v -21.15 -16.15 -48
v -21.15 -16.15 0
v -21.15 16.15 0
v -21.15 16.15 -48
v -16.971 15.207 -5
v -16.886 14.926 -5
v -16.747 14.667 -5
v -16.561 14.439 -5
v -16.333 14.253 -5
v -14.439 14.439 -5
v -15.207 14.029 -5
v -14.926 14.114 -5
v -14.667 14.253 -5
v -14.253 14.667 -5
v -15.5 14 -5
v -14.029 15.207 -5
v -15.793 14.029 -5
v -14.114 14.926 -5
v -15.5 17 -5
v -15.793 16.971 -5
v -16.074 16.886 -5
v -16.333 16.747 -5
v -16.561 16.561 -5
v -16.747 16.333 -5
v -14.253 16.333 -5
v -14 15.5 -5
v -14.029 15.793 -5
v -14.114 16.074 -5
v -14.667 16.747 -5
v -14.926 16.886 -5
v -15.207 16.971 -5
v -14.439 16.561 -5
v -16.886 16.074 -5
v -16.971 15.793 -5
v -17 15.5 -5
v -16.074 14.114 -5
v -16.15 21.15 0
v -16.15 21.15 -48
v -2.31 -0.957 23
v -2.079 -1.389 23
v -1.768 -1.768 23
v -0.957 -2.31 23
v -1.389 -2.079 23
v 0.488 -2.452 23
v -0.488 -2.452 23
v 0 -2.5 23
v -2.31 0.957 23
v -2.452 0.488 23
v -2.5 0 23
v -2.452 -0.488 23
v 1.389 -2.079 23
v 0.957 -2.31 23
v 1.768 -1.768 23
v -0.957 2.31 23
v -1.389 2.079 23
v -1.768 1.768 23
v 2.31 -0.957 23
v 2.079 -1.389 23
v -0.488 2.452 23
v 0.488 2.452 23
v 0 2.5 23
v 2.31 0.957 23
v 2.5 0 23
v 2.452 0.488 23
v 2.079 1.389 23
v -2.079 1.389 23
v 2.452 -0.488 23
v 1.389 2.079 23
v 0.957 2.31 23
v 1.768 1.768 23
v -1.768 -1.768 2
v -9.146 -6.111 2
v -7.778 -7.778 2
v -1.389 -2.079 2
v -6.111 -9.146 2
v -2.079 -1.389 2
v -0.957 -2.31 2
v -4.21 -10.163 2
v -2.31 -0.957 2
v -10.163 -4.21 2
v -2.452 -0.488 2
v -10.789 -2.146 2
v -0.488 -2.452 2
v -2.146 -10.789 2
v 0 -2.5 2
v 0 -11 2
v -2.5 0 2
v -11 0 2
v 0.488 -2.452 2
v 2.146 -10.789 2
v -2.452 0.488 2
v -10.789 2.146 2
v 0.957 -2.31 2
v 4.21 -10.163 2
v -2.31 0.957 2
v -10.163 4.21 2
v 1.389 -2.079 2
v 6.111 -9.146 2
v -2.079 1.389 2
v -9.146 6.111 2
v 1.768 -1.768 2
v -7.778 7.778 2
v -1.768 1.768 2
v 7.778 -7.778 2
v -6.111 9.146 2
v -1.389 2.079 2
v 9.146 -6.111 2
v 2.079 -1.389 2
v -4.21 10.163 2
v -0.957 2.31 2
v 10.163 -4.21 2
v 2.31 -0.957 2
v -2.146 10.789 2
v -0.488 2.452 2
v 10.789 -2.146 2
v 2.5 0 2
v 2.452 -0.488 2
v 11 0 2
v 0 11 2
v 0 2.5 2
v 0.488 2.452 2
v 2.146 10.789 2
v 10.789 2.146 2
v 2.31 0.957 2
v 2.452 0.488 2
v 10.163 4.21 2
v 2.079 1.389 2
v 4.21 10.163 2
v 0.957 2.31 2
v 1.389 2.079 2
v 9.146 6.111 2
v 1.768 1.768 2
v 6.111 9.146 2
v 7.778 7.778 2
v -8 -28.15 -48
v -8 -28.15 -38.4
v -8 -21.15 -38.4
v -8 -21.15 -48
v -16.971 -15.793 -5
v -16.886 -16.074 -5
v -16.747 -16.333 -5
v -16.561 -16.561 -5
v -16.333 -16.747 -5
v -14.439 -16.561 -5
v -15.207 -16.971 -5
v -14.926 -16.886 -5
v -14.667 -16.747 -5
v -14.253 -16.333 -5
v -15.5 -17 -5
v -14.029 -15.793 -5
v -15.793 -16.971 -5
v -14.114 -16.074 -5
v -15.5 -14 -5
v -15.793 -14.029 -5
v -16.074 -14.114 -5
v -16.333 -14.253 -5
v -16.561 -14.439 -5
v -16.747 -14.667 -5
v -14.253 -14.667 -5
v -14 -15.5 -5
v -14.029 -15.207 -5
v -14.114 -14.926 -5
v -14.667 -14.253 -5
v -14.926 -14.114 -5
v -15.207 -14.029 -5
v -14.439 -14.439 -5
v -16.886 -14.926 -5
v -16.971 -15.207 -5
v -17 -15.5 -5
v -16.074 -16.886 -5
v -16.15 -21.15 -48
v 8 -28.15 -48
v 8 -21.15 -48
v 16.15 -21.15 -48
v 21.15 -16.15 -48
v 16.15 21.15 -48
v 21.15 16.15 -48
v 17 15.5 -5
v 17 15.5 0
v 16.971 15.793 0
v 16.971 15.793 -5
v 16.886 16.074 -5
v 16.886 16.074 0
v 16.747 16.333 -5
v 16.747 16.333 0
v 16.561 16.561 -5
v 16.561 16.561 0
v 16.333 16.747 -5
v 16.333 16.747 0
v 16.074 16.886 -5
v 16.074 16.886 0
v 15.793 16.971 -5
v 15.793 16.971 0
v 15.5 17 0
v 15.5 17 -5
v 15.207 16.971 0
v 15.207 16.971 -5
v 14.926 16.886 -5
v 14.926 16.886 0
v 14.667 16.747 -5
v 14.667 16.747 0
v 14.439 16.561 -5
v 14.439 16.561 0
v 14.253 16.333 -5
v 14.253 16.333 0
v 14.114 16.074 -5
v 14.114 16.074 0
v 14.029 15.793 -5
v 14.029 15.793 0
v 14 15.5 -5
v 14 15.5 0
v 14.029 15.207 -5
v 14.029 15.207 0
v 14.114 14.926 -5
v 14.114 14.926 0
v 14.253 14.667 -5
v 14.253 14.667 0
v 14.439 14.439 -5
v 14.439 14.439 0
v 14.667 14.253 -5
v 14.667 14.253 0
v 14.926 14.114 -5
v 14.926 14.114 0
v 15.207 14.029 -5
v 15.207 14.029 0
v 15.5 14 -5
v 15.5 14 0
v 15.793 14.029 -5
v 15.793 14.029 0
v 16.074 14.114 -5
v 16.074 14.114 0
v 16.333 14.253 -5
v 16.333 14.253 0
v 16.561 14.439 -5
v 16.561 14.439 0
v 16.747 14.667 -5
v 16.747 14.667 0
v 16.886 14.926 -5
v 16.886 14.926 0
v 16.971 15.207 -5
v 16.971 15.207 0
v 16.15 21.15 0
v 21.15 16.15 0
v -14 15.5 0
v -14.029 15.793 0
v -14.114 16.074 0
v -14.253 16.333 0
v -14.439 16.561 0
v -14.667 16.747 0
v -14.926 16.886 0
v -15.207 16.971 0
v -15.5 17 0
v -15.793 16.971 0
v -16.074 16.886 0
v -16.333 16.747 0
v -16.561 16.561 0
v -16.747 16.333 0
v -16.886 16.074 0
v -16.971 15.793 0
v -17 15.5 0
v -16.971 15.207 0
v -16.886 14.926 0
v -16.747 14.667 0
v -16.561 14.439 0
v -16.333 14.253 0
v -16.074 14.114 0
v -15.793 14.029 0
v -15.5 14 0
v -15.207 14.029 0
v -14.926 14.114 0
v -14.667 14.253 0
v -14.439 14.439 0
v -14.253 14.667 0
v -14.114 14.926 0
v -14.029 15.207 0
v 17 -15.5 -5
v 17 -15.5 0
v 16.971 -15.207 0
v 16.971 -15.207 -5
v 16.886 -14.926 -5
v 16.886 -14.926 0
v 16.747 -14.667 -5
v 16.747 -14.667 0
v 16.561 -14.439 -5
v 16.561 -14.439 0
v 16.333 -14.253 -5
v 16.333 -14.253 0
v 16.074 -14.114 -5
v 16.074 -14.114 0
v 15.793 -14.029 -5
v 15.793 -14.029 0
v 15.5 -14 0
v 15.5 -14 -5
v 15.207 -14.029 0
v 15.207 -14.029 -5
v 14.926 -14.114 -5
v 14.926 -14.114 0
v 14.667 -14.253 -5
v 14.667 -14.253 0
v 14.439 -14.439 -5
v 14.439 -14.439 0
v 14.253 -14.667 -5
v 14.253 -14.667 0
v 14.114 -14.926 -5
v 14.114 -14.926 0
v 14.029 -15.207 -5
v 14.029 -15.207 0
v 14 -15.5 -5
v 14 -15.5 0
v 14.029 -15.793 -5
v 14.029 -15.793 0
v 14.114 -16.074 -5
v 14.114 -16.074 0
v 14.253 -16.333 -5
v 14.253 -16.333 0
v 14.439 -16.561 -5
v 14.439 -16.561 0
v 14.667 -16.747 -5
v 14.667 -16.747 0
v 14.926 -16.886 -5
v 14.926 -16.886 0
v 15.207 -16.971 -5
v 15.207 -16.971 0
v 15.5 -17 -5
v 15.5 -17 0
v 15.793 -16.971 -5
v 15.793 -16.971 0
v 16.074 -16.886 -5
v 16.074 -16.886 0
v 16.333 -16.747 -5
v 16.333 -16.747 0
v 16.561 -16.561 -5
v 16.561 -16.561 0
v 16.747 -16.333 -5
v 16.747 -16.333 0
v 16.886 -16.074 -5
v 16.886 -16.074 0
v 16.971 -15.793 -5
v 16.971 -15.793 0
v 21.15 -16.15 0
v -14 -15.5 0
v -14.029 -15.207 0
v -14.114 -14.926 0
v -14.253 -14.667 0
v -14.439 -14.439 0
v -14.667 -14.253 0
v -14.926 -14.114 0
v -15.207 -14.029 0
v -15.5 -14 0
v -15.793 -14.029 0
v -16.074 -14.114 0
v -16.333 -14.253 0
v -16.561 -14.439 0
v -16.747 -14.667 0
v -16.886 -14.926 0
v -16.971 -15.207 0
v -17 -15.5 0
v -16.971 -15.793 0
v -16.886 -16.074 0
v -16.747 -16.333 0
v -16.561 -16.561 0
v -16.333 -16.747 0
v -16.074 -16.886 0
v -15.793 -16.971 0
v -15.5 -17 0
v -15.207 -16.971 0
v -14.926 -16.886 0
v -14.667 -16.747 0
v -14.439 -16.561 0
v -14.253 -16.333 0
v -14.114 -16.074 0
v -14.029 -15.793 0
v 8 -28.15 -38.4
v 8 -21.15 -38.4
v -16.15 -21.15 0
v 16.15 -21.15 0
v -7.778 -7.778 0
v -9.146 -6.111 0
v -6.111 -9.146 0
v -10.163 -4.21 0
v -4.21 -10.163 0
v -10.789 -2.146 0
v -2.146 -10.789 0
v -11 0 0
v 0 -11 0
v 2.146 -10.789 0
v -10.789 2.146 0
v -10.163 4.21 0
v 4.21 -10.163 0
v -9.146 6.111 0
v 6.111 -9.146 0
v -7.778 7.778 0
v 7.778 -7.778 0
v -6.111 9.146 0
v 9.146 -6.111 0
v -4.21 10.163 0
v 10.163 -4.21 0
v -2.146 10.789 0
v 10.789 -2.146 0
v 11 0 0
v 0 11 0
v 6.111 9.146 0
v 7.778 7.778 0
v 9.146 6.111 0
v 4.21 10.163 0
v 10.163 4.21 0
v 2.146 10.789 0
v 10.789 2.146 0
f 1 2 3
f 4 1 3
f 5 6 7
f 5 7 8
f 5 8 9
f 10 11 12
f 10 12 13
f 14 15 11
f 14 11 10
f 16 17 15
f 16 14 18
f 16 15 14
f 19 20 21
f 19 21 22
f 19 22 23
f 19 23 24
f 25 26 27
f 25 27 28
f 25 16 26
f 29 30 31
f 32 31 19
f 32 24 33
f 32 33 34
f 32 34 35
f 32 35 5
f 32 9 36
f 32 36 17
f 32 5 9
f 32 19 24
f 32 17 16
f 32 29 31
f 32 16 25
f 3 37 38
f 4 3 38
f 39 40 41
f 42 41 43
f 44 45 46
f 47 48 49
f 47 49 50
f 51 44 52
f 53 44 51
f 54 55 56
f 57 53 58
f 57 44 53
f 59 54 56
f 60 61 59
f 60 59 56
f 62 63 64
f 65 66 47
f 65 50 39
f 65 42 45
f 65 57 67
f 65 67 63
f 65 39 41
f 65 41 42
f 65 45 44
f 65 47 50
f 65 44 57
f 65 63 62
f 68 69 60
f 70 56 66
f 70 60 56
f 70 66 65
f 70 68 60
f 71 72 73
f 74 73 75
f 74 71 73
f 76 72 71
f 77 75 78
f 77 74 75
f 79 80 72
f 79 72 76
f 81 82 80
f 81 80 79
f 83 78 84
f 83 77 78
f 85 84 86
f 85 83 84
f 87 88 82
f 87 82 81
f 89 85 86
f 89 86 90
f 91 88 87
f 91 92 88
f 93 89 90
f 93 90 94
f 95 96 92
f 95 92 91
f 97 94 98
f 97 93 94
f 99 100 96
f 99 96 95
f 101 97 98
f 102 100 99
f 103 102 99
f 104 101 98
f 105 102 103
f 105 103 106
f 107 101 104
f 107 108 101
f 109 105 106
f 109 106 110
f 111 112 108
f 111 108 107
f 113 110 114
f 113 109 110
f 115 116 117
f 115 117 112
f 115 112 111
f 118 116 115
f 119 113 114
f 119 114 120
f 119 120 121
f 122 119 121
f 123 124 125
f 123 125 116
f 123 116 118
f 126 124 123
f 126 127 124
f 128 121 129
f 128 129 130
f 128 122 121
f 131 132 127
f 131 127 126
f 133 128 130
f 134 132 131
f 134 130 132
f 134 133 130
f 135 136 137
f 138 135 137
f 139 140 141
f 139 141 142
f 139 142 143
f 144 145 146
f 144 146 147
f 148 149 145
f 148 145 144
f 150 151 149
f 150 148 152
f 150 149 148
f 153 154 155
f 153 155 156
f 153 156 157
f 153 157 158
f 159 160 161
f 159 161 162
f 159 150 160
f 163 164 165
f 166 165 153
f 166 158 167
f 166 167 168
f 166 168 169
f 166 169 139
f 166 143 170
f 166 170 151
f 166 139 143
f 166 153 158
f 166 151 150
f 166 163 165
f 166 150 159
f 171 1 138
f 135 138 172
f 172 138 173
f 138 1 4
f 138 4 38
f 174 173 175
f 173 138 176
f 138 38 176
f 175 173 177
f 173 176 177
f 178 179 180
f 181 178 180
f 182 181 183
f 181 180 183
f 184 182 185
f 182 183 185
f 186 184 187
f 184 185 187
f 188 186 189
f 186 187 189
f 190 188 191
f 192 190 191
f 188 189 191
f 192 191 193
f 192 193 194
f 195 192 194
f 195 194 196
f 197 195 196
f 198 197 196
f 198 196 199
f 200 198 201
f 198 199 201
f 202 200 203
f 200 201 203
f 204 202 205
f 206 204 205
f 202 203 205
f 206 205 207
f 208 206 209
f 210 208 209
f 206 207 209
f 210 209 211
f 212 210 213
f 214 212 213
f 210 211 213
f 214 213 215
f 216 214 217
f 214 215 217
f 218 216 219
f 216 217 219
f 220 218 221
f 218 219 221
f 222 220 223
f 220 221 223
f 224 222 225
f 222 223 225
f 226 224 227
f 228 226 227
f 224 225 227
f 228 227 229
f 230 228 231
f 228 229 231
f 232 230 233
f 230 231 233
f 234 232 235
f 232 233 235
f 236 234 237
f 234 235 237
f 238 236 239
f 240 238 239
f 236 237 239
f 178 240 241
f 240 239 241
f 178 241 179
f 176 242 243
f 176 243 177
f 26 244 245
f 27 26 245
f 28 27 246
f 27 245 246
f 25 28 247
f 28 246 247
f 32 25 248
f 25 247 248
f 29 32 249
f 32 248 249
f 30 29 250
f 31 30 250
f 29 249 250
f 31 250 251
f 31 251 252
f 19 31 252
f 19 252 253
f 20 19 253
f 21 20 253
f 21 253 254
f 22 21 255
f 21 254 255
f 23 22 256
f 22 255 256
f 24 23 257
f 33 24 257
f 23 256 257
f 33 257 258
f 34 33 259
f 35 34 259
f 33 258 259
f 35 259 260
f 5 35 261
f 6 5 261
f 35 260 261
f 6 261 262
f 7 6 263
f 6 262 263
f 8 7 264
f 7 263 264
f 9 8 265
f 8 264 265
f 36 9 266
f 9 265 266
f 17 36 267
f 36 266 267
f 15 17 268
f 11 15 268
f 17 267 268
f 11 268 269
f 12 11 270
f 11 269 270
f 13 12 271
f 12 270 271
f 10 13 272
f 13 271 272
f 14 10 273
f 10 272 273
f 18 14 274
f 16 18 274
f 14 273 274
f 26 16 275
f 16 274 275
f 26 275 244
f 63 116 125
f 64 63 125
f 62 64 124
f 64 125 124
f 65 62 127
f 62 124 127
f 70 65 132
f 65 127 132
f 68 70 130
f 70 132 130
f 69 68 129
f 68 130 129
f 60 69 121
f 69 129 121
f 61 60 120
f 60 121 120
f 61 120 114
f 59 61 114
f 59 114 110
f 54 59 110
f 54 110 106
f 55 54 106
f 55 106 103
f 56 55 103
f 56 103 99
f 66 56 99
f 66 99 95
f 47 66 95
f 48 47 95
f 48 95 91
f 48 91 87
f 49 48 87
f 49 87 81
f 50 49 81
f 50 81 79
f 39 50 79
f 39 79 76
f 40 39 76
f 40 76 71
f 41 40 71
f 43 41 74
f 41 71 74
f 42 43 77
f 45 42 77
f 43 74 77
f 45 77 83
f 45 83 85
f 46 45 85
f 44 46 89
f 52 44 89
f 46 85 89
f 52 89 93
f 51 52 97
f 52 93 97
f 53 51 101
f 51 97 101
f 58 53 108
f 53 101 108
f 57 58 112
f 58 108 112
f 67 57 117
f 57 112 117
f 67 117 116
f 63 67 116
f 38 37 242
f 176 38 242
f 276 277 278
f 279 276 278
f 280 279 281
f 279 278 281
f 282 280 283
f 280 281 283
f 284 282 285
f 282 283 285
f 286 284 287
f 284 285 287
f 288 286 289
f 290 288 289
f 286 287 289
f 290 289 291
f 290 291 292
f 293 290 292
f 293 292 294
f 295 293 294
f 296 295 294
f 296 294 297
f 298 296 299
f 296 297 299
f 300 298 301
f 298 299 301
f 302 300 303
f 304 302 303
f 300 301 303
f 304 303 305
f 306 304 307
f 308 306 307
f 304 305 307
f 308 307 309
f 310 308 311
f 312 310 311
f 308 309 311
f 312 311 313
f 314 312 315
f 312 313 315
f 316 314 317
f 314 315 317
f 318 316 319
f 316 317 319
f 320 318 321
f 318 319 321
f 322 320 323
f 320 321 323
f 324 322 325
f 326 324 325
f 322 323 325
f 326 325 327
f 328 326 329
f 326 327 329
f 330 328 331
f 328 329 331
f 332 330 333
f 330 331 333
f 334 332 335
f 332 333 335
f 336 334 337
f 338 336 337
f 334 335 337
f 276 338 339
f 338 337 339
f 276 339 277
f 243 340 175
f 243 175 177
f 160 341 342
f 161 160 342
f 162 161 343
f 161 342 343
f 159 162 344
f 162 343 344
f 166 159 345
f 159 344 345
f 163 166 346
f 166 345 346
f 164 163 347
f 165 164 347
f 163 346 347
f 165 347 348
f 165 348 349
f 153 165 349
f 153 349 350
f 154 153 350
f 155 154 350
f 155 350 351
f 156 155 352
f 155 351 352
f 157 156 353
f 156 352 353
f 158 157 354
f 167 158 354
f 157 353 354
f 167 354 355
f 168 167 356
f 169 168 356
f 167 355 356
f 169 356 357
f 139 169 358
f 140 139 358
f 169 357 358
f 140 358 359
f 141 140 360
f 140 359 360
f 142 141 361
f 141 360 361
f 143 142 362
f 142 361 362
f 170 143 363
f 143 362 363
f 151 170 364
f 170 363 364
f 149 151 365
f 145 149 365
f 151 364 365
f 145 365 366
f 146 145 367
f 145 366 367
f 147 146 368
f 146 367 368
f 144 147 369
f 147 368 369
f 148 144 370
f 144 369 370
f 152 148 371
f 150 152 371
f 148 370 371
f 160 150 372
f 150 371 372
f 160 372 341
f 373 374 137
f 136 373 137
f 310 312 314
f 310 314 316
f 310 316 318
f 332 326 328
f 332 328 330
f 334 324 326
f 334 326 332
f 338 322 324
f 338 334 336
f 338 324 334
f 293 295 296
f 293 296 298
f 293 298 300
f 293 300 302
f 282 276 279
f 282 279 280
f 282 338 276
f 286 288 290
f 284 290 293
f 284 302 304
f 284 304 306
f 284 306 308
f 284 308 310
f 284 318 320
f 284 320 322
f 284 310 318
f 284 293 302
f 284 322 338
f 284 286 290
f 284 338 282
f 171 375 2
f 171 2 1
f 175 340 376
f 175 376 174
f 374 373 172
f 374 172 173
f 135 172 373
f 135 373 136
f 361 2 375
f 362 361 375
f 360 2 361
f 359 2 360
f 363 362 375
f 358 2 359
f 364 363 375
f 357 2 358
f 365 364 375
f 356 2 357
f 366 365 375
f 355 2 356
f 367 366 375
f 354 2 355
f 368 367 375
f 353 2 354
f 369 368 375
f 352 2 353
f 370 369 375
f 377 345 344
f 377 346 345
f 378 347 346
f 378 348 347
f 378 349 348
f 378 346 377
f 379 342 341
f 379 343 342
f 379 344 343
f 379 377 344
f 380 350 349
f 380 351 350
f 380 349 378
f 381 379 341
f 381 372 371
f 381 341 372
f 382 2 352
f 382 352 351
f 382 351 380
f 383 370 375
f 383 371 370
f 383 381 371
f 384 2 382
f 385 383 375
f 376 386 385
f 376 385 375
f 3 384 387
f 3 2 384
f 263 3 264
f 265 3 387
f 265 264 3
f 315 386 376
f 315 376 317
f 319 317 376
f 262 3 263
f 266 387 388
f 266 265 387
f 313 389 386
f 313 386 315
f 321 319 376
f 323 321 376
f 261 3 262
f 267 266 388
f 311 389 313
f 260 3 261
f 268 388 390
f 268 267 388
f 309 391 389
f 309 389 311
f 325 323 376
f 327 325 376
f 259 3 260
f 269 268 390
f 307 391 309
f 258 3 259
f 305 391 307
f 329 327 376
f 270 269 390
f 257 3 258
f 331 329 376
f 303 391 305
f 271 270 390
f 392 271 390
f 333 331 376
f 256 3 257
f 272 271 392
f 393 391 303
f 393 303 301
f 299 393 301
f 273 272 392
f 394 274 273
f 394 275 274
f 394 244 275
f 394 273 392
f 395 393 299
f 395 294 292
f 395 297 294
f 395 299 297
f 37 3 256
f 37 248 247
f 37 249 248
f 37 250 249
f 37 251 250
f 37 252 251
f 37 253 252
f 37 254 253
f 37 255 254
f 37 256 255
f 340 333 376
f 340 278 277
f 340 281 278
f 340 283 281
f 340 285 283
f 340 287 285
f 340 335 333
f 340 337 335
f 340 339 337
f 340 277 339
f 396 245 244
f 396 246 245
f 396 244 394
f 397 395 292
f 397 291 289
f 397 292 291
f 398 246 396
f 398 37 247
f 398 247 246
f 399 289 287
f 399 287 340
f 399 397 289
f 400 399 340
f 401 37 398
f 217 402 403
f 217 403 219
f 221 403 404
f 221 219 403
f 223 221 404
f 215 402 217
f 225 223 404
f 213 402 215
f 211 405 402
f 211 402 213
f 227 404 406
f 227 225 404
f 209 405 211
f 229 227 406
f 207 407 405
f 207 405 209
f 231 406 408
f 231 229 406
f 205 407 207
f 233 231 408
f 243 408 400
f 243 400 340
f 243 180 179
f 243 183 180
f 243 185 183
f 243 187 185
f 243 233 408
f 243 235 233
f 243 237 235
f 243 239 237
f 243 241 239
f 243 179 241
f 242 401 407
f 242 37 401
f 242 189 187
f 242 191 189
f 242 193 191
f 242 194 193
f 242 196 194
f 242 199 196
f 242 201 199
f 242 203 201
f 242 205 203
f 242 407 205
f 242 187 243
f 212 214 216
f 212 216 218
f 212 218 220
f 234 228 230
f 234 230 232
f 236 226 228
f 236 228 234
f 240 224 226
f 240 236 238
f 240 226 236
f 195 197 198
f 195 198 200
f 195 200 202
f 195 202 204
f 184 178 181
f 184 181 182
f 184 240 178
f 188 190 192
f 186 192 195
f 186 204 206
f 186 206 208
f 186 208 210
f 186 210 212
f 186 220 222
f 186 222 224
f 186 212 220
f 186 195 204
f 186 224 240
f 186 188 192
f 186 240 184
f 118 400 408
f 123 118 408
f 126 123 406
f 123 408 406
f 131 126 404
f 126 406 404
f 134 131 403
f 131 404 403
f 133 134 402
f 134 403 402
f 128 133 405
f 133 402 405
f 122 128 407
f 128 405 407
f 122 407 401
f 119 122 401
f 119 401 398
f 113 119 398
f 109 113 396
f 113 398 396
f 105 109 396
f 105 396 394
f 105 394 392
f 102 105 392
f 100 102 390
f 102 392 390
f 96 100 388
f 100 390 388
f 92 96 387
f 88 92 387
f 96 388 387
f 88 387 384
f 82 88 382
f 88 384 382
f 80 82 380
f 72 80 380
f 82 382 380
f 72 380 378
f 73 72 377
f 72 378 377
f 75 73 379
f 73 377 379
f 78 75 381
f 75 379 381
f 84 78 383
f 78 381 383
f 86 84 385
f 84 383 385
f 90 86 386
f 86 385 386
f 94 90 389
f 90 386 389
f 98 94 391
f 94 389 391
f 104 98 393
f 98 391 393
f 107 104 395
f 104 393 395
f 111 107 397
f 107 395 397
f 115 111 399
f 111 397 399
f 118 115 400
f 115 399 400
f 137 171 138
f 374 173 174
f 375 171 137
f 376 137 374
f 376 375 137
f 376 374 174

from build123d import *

# Parameters (mm, degrees)
SKETCH1_W           = 42.3
SKETCH1_H           = 42.3
BOSS_EXTRUDE1_DEPTH = 48
CHAMFER1_SIZE       = 5
SKETCH3_R           = 1.5
CUT_EXTRUDE1_DEPTH  = 5
SKETCH4_R           = 11
BOSS_EXTRUDE2_DEPTH = 2
SKETCH5_R           = 2.5
BOSS_EXTRUDE3_DEPTH = 23
SKETCH6_W           = 16
SKETCH6_H           = 7
BOSS_EXTRUDE4_DEPTH = 9.6


with BuildPart() as part:
    # Sketch1 → Boss-Extrude1 (new body)
    with BuildSketch(Plane.XY):
        Rectangle(SKETCH1_W, SKETCH1_H)
    extrude(amount=-BOSS_EXTRUDE1_DEPTH)

    # Chamfer1
    chamfer1_edges = [part.edges().sort_by_distance(p)[0] for p in [
        (21.15, -21.15, -24),
        (-21.15, -21.15, -24),
        (-21.15, 21.15, -24),
        (21.15, 21.15, -24),
    ]]
    chamfer(chamfer1_edges, length=CHAMFER1_SIZE)

    # Sketch3 → Cut-Extrude1 (cut)
    with BuildSketch(Plane.XY):
        with Locations((15.5, -15.5)):
            Circle(SKETCH3_R)
        with Locations((-15.5, -15.5)):
            Circle(SKETCH3_R)
        with Locations((-15.5, 15.5)):
            Circle(SKETCH3_R)
        with Locations((15.5, 15.5)):
            Circle(SKETCH3_R)
    extrude(amount=-CUT_EXTRUDE1_DEPTH, mode=Mode.SUBTRACT)

    # Sketch4 → Boss-Extrude2 (add)
    with BuildSketch(Plane.XY):
        Circle(SKETCH4_R)
    extrude(amount=BOSS_EXTRUDE2_DEPTH)

    # Sketch5 → Boss-Extrude3 (add)
    with BuildSketch(Plane.XY):
        Circle(SKETCH5_R)
    extrude(amount=BOSS_EXTRUDE3_DEPTH)

    # Sketch6 → Boss-Extrude4 (add)
    with BuildSketch(Plane(origin=(0, 0, -48), x_dir=(-1, 0, 0), z_dir=(0, 0, -1))):
        with Locations((0, -24.65)):
            Rectangle(SKETCH6_W, SKETCH6_H)
    extrude(amount=-BOSS_EXTRUDE4_DEPTH)


solid = part.part
